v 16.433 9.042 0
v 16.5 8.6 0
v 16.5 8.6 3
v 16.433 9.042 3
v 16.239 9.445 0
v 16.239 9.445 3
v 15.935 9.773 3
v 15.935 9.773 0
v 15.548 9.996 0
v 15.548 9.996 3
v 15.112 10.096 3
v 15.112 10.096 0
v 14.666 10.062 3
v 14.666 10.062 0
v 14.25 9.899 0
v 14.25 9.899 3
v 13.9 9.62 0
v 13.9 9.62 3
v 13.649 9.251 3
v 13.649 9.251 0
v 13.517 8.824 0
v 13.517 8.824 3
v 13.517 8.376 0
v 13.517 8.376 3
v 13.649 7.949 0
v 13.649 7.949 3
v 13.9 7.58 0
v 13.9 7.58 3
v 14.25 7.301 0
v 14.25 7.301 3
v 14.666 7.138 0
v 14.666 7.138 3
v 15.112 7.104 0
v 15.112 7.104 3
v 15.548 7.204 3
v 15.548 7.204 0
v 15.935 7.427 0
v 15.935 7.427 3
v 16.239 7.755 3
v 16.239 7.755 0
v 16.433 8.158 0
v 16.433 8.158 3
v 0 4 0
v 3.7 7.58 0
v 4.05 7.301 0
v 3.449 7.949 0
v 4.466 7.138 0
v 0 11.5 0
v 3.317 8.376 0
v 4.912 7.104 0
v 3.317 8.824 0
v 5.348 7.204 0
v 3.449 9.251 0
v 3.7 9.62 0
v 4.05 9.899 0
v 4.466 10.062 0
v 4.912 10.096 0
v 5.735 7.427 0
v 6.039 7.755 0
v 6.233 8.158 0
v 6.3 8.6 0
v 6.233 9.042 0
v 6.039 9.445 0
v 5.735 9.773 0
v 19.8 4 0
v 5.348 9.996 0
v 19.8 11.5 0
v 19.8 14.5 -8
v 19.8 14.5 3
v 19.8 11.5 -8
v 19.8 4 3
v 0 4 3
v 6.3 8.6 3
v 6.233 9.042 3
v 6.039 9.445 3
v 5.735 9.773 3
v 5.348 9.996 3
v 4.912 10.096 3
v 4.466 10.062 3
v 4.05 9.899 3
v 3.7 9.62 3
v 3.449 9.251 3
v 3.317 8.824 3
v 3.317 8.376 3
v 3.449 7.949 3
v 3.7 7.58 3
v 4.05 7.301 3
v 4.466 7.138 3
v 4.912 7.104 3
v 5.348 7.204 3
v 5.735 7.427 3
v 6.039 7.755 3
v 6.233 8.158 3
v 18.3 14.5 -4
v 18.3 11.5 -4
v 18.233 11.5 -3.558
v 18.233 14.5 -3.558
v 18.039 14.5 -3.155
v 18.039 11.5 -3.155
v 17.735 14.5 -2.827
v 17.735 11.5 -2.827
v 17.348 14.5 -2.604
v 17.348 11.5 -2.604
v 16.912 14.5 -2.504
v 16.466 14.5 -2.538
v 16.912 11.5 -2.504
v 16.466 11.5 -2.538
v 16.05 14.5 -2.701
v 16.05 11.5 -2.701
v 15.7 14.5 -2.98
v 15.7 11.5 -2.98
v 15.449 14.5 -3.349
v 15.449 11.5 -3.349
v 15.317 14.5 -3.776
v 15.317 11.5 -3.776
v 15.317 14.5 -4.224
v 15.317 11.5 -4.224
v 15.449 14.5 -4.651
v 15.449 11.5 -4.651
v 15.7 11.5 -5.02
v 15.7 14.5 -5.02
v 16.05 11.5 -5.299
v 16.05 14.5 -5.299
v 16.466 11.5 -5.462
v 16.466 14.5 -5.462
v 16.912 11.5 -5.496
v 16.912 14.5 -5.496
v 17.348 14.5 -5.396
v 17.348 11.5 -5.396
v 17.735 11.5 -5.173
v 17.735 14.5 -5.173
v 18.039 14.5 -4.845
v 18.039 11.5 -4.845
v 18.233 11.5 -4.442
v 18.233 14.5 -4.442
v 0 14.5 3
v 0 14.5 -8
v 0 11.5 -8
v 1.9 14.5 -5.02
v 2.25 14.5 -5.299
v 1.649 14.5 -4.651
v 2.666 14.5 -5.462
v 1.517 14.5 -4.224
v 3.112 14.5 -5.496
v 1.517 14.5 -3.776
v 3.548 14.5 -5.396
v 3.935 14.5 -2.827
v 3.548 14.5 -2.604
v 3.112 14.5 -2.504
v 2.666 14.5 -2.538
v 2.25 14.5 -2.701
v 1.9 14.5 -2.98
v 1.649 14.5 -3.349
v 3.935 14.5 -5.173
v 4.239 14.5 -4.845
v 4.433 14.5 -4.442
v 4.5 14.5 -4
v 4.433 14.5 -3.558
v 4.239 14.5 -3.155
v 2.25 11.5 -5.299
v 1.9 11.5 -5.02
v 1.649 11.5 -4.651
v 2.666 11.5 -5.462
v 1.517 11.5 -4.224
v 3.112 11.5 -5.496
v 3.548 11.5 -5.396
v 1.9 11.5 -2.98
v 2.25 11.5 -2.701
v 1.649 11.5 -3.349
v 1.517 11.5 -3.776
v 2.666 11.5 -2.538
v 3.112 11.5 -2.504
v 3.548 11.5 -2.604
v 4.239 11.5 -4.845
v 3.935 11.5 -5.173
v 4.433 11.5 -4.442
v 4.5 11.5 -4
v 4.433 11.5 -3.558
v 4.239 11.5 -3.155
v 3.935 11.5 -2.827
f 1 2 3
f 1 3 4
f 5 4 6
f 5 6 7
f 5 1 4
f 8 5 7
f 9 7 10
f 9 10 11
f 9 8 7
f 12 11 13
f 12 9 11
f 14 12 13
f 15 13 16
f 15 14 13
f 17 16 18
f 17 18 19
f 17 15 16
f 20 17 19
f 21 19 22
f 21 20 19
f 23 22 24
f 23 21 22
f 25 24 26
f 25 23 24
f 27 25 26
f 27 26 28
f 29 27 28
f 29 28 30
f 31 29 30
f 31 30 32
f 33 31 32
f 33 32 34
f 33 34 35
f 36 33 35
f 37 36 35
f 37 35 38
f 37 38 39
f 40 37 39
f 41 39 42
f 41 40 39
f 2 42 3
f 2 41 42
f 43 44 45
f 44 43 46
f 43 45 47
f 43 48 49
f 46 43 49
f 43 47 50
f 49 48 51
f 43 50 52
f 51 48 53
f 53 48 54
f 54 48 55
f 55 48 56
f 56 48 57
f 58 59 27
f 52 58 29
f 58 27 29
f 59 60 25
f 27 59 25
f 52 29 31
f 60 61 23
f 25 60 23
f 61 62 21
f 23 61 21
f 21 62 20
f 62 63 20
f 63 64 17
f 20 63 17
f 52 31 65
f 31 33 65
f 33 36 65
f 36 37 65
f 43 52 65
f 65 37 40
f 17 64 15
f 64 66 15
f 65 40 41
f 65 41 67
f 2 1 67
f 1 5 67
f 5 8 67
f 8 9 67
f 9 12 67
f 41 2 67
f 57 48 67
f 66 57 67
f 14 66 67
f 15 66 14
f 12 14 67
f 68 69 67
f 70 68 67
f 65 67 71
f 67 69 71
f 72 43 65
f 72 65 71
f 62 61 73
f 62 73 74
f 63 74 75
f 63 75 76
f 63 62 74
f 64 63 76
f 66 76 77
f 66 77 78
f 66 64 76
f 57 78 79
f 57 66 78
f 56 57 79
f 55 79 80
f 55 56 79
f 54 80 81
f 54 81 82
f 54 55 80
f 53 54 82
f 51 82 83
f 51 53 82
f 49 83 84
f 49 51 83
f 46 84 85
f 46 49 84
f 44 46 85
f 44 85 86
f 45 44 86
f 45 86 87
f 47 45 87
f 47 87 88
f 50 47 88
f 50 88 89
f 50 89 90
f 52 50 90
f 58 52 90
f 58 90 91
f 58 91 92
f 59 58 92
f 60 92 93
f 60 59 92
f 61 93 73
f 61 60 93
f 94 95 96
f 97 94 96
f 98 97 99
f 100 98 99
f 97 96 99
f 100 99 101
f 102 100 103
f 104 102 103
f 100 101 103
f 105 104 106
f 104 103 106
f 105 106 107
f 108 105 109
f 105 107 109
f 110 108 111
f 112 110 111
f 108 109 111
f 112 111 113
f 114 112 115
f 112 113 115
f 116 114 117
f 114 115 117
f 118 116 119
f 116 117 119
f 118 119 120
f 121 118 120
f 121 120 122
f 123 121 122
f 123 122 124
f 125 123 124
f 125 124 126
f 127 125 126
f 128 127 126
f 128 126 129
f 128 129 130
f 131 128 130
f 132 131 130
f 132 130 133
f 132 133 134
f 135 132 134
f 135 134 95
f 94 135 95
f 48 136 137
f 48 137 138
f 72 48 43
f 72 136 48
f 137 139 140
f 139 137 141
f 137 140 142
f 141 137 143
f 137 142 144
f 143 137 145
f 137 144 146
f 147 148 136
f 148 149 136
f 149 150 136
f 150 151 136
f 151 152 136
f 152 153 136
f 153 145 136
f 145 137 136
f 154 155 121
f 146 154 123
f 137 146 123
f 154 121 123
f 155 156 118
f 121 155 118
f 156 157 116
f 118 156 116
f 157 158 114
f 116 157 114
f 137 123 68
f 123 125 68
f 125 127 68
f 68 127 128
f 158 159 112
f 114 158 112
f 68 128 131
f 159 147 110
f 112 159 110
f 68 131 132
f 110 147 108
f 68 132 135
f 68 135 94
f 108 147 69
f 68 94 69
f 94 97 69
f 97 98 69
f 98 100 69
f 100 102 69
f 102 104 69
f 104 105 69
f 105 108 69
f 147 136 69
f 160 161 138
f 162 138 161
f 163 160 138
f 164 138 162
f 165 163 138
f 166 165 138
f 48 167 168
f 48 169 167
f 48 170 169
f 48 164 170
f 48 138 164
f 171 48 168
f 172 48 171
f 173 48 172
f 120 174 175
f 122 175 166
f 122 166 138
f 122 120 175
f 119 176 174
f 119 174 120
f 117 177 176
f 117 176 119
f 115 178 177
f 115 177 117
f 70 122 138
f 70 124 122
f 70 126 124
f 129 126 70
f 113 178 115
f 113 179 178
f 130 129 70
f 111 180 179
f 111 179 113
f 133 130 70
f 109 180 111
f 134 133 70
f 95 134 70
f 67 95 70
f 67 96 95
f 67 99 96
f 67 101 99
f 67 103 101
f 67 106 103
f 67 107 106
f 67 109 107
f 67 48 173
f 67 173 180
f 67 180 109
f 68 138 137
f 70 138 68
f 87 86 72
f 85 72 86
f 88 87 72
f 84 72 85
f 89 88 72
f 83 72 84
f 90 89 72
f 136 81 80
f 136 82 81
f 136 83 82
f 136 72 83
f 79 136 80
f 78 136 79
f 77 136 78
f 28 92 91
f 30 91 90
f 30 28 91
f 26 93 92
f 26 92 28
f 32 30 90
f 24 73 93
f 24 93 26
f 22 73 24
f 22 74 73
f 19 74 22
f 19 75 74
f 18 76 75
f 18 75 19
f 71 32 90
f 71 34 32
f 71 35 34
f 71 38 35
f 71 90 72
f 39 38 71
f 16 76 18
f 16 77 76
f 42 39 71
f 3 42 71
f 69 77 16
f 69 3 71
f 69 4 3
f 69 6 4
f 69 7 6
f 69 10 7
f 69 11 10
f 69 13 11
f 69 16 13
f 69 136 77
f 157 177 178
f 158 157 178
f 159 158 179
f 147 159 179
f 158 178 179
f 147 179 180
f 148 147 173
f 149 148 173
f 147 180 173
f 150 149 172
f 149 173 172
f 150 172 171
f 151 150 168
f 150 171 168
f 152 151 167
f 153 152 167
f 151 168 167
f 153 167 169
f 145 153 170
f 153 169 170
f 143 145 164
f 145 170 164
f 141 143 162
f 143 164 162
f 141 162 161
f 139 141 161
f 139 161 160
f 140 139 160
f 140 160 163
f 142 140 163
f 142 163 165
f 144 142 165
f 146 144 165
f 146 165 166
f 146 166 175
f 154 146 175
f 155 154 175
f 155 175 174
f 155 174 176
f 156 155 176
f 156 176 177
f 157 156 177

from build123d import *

# Parameters (mm, degrees)
SKETCH_W        = 19.8
SKETCH_H        = 14.5
SKETCH_R        = 1.5
PAD_DEPTH       = 3
SKETCH001_W     = 19.8
SKETCH001_H     = 3
PAD001_DEPTH    = 8
SKETCH002_R     = 1.5
POCKET_DEPTH    = 3.001
SKETCH003_W     = 4
SKETCH003_H     = 3
POCKET001_DEPTH = 19.801


with BuildPart() as part:
    # Sketch → Pad (new body)
    with BuildSketch(Plane.XY):
        with Locations((9.9, 7.25)):
            Rectangle(SKETCH_W, SKETCH_H)
        with Locations((4.8, 8.6)):
            Circle(SKETCH_R, mode=Mode.SUBTRACT)
        with Locations((15, 8.6)):
            Circle(SKETCH_R, mode=Mode.SUBTRACT)
    extrude(amount=PAD_DEPTH)

    # Sketch001 → Pad001 (new body)
    with BuildSketch(Plane(origin=(0, 0, 0), x_dir=(1, 0, 0), z_dir=(0, 0, -1))):
        with Locations((9.9, -13)):
            Rectangle(SKETCH001_W, SKETCH001_H)
    extrude(amount=PAD001_DEPTH)

    # Sketch002 → Pocket (cut, through all)
    with BuildSketch(Plane.XZ.offset(-11.5)):
        with Locations((3, -4)):
            Circle(SKETCH002_R)
        with Locations((16.8, -4)):
            Circle(SKETCH002_R)
    extrude(amount=-POCKET_DEPTH, mode=Mode.SUBTRACT)

    # Sketch003 → Pocket001 (cut, through all)
    with BuildSketch(Plane.YZ.offset(19.8)):
        with Locations((2, 1.5)):
            Rectangle(SKETCH003_W, SKETCH003_H)
    extrude(amount=-POCKET001_DEPTH, mode=Mode.SUBTRACT)


solid = part.part
